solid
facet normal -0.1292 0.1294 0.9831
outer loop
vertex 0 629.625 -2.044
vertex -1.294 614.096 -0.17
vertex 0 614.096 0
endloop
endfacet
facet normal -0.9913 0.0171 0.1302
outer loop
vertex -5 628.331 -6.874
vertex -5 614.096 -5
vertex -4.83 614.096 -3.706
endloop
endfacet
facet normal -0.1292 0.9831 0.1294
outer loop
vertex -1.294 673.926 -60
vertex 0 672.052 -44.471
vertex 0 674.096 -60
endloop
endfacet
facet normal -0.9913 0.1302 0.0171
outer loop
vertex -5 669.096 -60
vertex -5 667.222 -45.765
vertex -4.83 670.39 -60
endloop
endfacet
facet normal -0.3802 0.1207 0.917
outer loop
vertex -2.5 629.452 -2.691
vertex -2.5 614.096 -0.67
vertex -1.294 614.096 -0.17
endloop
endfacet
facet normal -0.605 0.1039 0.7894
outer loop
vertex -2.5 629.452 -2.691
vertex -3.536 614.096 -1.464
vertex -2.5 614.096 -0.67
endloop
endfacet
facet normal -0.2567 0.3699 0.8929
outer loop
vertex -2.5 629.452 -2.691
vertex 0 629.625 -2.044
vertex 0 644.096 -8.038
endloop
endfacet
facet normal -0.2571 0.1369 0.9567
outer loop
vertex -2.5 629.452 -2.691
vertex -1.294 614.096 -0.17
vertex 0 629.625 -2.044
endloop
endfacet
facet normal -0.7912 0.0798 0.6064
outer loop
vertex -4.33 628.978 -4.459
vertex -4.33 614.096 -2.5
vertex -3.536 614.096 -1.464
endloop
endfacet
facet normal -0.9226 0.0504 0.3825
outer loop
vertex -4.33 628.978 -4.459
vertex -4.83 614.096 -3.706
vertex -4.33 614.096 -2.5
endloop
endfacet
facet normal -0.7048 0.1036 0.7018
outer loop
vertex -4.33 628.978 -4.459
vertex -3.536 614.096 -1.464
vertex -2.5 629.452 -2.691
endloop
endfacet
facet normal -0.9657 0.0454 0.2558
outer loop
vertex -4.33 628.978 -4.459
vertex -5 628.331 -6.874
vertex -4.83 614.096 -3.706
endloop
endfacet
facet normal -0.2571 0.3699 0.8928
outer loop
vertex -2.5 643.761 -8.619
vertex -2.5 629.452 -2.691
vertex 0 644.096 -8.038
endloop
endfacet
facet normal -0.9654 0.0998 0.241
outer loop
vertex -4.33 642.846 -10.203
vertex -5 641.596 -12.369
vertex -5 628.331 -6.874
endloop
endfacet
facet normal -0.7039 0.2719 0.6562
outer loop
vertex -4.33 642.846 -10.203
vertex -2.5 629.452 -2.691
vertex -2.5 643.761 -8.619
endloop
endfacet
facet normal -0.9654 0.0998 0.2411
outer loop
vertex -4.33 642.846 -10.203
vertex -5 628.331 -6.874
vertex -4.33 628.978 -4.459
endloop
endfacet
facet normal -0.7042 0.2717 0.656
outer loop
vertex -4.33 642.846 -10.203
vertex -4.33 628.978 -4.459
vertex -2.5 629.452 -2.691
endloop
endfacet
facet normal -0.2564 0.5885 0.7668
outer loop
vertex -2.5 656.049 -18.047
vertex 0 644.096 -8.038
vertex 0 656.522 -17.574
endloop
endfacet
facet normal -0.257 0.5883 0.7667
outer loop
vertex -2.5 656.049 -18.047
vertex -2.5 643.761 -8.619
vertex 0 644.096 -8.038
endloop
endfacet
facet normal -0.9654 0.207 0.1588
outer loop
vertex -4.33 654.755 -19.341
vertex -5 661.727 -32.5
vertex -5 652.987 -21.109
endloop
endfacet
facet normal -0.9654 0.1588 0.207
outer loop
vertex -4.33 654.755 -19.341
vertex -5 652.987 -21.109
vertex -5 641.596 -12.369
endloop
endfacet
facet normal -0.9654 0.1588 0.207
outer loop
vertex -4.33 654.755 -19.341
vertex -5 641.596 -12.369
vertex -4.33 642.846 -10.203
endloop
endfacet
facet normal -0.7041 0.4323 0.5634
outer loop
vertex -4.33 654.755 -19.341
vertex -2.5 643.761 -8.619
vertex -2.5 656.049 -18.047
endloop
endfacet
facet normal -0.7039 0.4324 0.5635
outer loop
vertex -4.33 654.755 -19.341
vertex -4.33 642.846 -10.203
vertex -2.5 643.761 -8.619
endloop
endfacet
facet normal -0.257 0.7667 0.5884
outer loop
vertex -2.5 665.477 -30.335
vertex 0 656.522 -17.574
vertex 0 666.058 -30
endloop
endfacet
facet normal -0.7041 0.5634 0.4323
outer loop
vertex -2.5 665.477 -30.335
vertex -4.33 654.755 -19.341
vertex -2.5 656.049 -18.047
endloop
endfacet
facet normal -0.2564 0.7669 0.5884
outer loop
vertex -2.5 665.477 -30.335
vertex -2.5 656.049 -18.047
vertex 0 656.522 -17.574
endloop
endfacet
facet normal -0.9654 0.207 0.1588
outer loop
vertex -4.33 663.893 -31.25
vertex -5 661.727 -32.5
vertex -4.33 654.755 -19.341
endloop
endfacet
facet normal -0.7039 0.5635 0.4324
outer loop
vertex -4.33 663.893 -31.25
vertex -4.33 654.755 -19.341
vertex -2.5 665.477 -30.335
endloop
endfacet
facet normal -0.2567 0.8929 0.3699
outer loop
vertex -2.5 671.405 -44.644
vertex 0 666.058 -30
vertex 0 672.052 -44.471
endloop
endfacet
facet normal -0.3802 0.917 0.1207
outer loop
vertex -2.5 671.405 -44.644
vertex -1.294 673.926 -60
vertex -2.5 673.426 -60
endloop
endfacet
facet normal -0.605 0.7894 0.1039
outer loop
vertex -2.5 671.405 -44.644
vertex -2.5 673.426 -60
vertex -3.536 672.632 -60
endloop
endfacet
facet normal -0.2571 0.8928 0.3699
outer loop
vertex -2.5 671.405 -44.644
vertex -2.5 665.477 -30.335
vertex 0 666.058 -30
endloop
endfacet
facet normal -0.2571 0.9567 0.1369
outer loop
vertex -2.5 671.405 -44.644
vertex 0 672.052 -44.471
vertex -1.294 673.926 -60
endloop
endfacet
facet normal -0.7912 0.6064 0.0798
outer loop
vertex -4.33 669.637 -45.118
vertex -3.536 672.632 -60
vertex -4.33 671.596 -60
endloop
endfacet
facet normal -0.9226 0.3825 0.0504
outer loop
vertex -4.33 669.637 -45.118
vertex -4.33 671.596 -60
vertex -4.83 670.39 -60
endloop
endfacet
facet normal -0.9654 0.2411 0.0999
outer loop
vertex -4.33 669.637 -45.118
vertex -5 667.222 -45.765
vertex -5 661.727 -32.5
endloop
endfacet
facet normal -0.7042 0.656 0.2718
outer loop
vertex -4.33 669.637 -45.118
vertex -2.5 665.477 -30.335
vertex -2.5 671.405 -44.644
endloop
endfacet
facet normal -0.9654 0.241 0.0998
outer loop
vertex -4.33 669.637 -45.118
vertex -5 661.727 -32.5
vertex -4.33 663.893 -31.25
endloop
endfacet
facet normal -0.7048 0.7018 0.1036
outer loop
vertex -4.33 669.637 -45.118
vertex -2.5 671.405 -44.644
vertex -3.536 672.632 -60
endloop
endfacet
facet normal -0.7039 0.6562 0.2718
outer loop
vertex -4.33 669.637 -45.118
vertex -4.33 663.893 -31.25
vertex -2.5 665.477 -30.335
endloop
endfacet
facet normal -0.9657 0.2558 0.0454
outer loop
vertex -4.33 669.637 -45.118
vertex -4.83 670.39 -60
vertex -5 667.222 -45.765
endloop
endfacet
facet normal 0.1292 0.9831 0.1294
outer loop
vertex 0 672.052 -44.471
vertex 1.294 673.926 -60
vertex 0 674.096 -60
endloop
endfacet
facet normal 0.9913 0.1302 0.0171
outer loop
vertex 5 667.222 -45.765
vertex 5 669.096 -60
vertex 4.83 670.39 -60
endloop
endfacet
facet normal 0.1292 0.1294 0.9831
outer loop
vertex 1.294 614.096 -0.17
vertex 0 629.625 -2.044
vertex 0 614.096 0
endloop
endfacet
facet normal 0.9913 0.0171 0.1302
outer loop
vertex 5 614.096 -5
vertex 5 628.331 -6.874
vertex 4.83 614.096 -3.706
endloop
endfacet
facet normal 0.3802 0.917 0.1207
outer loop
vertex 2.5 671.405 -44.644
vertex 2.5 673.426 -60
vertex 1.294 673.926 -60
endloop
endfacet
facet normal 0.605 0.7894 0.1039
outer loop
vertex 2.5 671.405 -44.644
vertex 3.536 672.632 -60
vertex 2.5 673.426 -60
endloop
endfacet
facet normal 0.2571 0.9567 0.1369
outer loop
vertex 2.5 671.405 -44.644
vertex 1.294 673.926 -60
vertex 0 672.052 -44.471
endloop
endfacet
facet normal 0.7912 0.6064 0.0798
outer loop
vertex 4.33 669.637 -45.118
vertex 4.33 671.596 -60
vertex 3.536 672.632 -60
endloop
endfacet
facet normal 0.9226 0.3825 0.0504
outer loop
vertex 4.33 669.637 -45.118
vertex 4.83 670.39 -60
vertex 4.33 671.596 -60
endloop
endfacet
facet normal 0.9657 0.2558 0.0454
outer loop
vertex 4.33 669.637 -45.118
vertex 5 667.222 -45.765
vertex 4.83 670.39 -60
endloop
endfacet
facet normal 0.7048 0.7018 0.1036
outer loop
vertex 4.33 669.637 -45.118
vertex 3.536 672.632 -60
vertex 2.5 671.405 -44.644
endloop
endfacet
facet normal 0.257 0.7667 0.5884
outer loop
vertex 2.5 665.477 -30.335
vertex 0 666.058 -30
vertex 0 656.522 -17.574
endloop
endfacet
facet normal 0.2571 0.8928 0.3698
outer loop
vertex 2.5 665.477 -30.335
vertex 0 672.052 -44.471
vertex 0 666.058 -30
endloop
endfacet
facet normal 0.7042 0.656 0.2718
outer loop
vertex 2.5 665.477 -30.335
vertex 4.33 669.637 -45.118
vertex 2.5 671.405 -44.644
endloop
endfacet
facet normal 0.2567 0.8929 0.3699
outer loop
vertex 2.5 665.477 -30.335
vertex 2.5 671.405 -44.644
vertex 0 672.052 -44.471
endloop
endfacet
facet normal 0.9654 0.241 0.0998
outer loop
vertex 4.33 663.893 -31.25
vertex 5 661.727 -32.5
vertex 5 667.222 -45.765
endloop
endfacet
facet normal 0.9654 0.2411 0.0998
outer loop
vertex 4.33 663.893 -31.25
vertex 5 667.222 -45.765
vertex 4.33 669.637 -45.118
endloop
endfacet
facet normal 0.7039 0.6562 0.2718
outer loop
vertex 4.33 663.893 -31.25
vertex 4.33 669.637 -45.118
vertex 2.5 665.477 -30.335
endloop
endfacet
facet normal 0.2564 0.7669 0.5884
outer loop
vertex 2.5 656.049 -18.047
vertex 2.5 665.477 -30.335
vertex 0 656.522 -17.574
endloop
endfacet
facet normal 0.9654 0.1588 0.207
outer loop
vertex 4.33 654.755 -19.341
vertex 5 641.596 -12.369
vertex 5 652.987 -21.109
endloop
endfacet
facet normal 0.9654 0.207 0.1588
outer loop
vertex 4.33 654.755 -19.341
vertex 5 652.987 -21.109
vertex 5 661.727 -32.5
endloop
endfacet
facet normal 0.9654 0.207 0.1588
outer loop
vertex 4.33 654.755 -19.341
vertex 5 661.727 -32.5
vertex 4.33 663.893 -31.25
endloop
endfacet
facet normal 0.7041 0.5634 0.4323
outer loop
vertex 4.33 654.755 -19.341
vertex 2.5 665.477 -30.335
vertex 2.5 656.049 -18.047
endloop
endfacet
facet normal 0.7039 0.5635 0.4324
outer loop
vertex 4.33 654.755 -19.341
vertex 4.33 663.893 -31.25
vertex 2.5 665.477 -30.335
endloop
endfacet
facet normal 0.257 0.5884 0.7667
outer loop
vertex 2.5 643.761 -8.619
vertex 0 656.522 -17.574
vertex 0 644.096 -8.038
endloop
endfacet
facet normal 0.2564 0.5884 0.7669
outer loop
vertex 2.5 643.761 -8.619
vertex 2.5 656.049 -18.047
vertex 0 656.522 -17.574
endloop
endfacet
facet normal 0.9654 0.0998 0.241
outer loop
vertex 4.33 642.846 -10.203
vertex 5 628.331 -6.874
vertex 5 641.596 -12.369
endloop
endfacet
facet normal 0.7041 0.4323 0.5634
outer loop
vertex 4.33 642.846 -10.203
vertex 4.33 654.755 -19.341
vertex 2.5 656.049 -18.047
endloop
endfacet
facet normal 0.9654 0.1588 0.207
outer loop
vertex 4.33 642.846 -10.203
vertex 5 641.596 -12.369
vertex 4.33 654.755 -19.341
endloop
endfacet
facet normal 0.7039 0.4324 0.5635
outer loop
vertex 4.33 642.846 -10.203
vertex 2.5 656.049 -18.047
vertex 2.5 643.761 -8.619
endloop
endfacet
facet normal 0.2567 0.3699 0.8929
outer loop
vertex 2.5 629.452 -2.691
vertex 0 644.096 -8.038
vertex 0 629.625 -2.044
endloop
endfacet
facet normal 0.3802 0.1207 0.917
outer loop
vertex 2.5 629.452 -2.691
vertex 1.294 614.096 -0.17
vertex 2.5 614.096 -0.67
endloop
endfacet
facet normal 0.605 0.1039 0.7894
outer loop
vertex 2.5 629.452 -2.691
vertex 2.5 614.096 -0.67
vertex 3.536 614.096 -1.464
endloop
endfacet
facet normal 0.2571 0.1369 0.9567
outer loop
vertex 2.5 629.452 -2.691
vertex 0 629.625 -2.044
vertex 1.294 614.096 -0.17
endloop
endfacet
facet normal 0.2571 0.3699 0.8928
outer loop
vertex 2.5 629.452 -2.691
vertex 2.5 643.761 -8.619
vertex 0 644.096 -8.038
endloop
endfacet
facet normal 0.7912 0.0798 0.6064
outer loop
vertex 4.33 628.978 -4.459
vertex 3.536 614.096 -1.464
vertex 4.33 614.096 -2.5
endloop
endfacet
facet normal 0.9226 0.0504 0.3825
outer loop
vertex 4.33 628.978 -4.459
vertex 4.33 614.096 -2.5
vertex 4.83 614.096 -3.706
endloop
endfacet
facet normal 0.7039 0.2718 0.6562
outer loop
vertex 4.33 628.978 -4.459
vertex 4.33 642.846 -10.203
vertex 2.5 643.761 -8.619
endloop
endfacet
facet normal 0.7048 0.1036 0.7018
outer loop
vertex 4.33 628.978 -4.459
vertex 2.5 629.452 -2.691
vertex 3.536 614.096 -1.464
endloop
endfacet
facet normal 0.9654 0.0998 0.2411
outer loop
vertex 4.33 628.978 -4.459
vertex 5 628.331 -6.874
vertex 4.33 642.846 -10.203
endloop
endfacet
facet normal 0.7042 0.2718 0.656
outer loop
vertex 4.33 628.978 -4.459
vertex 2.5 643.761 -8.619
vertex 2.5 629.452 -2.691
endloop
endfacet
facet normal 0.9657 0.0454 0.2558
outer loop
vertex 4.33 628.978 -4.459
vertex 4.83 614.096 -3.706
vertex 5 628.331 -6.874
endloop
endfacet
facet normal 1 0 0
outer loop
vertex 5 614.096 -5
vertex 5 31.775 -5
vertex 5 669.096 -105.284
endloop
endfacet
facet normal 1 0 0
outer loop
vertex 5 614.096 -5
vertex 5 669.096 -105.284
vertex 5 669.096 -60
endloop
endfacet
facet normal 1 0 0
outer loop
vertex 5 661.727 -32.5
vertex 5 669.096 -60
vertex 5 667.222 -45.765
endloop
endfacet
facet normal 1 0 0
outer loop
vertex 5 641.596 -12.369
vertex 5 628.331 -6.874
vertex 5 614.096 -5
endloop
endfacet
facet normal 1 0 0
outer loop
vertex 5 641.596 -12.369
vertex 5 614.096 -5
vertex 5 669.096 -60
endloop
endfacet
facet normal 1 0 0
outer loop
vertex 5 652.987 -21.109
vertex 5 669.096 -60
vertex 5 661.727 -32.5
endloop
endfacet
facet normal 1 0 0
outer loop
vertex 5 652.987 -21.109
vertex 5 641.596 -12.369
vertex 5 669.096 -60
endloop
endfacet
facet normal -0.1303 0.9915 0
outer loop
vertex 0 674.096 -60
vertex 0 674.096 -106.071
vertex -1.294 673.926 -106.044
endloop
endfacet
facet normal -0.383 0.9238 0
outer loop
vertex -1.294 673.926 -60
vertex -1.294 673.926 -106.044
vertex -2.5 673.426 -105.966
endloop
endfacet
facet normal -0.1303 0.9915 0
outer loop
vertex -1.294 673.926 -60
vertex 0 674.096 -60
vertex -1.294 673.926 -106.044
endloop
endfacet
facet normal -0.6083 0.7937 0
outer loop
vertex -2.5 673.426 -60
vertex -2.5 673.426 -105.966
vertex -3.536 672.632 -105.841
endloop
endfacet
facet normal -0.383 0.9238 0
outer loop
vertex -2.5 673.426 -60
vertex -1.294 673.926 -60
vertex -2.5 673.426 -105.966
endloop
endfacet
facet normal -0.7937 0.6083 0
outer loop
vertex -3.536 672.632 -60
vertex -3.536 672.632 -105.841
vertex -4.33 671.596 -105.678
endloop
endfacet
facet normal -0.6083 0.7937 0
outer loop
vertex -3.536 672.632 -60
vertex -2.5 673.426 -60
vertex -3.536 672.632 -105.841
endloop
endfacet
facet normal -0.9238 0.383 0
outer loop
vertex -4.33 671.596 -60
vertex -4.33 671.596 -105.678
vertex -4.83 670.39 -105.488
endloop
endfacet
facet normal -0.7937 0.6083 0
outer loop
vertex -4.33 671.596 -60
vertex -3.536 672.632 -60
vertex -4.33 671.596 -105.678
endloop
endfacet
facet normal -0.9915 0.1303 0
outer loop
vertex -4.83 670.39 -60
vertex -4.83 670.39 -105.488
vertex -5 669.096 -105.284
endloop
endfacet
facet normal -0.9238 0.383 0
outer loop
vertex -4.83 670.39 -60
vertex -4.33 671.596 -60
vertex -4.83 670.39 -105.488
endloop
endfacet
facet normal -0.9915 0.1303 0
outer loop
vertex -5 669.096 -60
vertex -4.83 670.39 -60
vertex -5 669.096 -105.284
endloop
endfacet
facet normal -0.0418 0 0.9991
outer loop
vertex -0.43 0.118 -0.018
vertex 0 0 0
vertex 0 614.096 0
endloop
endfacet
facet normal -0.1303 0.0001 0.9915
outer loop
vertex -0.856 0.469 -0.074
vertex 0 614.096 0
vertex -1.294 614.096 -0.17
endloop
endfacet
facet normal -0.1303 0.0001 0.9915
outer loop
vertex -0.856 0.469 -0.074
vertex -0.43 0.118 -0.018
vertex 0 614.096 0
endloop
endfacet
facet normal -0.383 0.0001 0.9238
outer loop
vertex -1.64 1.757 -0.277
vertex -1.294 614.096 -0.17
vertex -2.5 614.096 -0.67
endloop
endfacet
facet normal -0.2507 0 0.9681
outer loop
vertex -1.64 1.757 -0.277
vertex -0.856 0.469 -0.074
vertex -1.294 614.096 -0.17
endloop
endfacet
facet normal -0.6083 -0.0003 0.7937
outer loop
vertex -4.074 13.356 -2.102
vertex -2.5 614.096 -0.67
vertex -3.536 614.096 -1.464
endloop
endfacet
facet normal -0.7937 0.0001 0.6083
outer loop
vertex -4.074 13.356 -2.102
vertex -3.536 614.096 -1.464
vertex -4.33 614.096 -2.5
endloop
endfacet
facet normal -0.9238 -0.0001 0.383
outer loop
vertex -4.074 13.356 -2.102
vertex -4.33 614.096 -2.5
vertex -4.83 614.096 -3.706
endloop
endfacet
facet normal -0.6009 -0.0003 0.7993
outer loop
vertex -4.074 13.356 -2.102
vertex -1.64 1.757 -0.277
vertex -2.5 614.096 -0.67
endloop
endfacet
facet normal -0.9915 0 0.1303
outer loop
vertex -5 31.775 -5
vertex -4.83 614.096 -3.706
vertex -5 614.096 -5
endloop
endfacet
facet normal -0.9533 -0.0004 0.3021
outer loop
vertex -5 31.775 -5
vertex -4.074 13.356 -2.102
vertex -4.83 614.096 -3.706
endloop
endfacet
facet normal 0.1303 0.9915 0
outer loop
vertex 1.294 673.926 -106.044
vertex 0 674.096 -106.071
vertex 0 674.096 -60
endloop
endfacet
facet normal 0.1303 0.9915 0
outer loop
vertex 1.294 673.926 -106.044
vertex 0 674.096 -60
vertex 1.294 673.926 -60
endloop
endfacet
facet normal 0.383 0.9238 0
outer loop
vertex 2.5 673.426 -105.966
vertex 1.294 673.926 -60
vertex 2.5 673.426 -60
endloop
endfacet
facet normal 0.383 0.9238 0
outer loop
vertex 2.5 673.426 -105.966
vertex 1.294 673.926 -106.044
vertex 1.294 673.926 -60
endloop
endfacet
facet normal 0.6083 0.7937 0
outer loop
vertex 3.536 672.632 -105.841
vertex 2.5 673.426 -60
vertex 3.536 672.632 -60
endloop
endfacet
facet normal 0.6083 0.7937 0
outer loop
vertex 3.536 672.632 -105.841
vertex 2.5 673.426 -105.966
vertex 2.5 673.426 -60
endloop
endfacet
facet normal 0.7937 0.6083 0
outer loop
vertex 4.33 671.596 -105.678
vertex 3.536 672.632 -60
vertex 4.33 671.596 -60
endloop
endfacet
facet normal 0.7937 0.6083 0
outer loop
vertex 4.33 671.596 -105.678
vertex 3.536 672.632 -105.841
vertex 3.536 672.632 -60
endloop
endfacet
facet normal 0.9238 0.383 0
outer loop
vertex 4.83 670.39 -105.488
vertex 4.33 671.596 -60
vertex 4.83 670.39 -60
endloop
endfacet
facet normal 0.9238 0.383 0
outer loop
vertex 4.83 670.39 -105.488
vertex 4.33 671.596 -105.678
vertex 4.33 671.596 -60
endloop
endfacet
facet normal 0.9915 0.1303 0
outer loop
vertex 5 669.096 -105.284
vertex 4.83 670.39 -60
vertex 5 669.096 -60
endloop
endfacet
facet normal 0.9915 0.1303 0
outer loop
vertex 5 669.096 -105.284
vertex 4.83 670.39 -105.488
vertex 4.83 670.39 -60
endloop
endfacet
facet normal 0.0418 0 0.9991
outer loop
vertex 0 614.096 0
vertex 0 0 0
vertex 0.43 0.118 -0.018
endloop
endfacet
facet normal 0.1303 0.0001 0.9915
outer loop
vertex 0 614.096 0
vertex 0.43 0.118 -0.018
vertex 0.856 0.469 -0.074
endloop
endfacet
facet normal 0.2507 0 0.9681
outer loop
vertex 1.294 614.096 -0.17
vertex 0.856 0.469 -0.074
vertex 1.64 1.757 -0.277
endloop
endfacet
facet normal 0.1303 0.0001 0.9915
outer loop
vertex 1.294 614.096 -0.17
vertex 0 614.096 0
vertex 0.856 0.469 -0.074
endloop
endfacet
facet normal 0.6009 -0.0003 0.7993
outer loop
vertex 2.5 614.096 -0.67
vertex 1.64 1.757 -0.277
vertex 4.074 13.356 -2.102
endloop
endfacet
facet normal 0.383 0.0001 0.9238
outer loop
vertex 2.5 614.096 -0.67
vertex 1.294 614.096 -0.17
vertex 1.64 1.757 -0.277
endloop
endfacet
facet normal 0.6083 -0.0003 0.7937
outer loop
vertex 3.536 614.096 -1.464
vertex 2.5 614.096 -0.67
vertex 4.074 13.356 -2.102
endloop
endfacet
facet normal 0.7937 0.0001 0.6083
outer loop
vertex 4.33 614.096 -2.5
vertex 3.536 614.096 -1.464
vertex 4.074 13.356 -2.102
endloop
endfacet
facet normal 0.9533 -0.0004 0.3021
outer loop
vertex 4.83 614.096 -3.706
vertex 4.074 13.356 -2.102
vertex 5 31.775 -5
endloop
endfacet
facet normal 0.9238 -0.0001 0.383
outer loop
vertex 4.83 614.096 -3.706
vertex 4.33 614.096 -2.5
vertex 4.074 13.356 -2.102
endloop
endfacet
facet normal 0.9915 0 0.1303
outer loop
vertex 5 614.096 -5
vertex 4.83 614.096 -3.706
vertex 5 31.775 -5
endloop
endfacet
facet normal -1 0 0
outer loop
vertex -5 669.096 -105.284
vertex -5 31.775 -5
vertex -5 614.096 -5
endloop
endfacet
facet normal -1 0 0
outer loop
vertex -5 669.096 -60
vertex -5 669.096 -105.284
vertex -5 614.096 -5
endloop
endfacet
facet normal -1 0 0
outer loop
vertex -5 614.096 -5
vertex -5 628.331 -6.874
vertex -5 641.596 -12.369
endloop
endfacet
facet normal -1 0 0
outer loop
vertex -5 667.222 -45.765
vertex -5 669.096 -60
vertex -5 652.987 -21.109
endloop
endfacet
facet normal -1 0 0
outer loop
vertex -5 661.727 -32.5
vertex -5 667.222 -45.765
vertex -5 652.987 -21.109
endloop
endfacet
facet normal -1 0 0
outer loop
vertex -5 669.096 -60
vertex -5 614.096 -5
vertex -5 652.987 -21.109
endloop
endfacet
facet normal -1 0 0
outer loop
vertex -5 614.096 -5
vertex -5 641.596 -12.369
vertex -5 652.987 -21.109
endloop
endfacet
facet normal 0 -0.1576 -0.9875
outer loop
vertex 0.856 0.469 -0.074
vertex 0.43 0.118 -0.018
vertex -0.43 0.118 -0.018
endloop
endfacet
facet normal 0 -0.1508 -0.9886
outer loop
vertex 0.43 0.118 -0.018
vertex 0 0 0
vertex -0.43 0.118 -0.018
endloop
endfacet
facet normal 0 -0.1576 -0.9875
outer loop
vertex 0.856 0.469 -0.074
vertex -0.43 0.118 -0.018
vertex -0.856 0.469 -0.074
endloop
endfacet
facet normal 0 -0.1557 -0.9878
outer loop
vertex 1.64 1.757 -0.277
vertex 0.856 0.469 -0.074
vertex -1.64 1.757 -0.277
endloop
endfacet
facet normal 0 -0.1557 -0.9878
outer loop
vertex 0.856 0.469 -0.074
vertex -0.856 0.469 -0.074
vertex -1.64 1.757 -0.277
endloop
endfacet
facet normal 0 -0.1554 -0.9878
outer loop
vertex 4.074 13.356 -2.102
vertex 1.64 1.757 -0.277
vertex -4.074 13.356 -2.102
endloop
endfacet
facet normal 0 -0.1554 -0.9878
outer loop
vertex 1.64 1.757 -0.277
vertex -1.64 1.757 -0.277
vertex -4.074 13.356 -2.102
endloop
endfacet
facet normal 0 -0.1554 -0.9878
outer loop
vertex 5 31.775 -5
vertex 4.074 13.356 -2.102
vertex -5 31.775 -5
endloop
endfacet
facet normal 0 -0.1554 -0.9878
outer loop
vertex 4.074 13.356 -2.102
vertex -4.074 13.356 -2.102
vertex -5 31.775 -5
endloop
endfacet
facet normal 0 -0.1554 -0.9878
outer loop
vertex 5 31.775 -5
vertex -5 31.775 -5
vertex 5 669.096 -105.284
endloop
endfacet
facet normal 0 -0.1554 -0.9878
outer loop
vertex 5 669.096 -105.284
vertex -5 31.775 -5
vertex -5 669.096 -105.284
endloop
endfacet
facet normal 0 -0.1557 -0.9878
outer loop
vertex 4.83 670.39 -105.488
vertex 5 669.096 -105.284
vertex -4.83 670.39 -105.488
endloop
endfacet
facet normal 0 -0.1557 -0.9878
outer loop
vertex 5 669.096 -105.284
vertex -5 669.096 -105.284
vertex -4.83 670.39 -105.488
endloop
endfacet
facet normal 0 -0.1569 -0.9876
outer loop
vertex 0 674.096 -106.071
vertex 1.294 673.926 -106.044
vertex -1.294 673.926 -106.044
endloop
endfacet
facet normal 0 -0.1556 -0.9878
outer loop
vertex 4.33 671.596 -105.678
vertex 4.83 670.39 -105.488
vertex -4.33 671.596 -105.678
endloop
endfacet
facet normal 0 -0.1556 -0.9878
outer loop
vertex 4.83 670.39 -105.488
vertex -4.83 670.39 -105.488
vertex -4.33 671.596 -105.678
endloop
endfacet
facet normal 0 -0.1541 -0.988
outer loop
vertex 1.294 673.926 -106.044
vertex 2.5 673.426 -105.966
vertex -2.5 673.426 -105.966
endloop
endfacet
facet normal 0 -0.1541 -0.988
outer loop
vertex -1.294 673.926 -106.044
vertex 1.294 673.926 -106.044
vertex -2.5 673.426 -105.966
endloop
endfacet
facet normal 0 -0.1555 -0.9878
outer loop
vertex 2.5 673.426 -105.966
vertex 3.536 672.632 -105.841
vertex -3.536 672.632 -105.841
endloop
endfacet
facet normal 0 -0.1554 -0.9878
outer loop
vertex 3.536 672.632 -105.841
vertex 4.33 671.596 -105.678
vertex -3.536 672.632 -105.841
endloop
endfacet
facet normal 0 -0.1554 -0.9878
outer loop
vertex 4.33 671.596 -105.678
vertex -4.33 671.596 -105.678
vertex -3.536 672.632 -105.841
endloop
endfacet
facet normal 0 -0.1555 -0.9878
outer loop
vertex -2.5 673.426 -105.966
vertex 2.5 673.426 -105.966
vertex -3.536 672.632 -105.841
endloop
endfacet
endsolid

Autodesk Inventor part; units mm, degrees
sketch "草圖1" plane through (0, 0, 0) normal (1, 0, 0) x (0, 1, 0)
  line L0 (0, 0) -> (674.096, -106.071)
  line L1 (0, 0) -> (614.096, 0)
  line L2 (674.096, -106.071) -> (674.096, -60)
  line L3 (674.096, -106.071) -> (0, -106.071) construction
  line L4 (0, 0) -> (0, -106.071)
  arc A0 (674.096, -60) -> (614.096, 0) centre (614.096, -60) ccw
  dimension "d0" = 106.071
  dimension "d1" = 674.096
  dimension "d2" = 60
extrude "擠出1" add sketch "草圖1" along normal mid plane 10
ref_plane "工作平面1" through (0, 674.096, 0) normal (0, 1, 0) x (-1, 0, 0)
fillet "圓角1" radius 5 6 edges at (-5, 656.5224, -17.5736) (-5, 307.048, 0) (-5, 674.096, -83.0355) (5, 307.048, 0) (5, 674.096, -83.0355) (5, 656.5224, -17.5736)
properties part number "路徑"
